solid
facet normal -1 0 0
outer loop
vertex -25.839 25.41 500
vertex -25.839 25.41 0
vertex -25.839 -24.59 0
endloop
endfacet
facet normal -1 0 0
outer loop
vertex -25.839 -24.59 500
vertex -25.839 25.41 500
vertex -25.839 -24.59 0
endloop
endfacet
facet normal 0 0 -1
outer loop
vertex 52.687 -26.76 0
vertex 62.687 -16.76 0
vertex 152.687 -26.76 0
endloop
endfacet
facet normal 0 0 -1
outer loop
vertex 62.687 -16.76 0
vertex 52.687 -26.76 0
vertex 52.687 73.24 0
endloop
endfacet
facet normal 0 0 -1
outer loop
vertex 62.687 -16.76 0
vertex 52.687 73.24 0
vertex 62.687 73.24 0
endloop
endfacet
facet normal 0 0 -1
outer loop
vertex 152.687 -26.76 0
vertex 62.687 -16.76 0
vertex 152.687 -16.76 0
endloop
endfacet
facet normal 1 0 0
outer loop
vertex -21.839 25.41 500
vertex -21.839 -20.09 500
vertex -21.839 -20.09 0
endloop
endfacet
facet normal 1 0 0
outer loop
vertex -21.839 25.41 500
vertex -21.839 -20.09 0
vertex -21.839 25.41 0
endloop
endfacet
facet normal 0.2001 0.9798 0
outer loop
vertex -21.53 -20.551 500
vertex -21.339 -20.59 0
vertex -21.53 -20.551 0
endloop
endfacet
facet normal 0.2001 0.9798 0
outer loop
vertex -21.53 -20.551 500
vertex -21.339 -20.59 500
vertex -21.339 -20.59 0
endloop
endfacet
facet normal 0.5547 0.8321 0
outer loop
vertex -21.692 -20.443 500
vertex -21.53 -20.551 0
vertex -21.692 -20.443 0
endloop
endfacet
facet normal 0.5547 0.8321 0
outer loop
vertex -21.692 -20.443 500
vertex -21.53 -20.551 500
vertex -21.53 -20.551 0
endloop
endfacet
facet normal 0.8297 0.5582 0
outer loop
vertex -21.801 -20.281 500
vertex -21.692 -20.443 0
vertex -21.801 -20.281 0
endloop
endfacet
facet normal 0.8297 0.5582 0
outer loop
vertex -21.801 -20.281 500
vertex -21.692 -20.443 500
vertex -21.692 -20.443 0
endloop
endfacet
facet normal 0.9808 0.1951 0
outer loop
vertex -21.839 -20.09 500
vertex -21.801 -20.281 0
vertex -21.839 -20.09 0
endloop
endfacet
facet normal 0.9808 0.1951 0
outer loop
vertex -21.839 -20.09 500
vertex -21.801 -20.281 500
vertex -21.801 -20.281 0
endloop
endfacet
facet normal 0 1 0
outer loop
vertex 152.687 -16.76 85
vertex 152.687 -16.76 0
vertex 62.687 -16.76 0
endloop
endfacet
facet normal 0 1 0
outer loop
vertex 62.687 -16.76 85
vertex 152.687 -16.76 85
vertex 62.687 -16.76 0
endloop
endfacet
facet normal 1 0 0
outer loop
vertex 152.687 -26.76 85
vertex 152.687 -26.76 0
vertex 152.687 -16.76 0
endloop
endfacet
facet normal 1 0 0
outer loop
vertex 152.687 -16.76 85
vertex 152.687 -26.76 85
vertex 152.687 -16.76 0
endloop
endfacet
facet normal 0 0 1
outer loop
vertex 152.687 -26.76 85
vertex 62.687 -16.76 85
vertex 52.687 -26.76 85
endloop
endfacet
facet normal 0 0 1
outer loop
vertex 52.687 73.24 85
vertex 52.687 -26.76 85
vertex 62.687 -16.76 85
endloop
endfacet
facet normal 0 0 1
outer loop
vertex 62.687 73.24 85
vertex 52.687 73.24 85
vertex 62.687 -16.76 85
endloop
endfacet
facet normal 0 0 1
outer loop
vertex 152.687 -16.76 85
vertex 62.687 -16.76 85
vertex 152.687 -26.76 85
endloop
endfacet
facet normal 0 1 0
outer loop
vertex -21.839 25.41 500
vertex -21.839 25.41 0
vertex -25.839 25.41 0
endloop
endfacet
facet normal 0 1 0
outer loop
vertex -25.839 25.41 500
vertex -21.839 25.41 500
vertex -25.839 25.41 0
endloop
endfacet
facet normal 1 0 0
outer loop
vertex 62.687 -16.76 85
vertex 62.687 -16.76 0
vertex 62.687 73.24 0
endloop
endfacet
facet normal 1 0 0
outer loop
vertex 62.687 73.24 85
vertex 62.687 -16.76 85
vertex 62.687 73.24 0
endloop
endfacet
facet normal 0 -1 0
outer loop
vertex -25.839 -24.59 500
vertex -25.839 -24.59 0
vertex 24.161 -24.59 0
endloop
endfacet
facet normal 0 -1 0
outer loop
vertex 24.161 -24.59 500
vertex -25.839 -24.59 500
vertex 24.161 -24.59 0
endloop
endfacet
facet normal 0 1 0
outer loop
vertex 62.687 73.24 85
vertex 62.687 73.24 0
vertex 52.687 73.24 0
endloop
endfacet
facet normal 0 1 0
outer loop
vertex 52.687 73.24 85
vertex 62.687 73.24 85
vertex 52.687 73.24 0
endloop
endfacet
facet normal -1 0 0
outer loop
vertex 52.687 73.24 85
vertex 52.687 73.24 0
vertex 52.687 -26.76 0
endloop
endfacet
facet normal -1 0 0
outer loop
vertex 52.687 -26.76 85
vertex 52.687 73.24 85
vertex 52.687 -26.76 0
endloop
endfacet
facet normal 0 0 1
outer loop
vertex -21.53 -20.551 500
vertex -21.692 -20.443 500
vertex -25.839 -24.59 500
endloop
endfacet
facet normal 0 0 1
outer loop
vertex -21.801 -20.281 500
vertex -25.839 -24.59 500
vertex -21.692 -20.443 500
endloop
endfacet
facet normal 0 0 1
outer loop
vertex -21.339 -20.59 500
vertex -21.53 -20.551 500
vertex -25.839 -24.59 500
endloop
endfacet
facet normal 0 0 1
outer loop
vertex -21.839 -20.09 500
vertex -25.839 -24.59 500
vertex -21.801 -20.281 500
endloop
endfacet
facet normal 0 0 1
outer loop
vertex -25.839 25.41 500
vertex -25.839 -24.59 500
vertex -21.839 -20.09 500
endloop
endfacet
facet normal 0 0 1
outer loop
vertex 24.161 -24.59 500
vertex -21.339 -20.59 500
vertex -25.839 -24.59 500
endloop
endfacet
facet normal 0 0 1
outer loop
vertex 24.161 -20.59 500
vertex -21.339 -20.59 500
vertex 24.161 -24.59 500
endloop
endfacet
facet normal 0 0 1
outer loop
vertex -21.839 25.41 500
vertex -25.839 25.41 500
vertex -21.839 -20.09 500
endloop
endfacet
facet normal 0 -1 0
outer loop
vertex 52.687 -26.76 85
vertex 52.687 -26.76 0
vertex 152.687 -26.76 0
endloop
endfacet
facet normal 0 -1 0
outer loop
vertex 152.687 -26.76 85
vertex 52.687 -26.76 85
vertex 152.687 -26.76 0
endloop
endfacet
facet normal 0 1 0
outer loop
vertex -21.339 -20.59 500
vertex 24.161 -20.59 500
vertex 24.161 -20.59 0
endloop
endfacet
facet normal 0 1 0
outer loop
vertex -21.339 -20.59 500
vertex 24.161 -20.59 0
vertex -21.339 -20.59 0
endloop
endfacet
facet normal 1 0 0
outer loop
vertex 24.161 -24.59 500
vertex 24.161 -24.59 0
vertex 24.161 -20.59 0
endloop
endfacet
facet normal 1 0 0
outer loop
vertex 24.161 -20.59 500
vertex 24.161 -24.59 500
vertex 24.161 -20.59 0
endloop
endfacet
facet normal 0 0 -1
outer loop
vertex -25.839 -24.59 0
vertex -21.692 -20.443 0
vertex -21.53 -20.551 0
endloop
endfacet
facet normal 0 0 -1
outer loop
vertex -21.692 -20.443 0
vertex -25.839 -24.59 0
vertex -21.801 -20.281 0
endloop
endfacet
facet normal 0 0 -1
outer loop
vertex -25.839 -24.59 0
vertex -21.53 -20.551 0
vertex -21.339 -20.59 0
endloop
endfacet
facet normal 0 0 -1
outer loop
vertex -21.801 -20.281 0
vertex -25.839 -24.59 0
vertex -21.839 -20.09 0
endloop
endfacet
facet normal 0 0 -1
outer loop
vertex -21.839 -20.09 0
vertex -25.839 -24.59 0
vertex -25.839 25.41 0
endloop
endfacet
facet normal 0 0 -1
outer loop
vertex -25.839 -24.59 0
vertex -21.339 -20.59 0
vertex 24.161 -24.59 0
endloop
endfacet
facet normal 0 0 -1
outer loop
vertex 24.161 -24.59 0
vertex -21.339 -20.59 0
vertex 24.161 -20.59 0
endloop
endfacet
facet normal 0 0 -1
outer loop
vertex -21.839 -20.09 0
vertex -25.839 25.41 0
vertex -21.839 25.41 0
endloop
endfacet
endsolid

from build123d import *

# Parameters (mm, degrees)
F2_DEPTH = 500
F3_R     = 0.5
F4_DEPTH = 85


with BuildPart() as f2:
    # F0 (on Top) → F2 (new body)
    with BuildSketch(Plane.XY):
        Polygon((-21.83867, 25.410469), (-25.83867, 25.410469), (-25.83867, -24.589531), (24.16133, -24.589531), (24.16133, -20.589531), (-21.83867, -20.589531), align=None)
    extrude(amount=F2_DEPTH)

    # F3
    f3_edges = [f2.edges().sort_by_distance(p)[0] for p in [
        (-21.83867, -20.589531, 250),
    ]]
    fillet(f3_edges, radius=F3_R)


with BuildPart() as f4:
    # F1 (on Top) → F4 (new body)
    with BuildSketch(Plane.XY):
        Polygon((62.687164, 73.239701), (52.687164, 73.239701), (52.687164, -26.760299), (152.687164, -26.760299), (152.687164, -16.760299), (62.687164, -16.760299), align=None)
    extrude(amount=F4_DEPTH)


solid = Compound([f2.part, f4.part])
